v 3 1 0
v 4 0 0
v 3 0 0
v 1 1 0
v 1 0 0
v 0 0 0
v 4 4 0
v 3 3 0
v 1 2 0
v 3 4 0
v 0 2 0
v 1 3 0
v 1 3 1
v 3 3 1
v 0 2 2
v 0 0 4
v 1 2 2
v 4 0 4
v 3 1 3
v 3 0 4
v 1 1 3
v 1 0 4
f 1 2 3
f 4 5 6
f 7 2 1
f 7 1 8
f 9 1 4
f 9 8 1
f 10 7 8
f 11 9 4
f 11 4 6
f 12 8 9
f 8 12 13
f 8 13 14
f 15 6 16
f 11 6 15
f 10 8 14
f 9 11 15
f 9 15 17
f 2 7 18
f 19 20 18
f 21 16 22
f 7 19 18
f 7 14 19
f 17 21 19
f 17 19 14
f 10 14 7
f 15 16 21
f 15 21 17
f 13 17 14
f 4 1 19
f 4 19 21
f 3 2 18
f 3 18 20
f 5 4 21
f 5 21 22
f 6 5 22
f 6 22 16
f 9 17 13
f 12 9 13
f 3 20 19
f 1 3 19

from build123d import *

# Parameters (mm, degrees)
BOSS_EXTRUDE1_DEPTH = 4
CUT_EXTRUDE2_DEPTH  = 10


with BuildPart() as part:
    # Sketch1 → Boss-Extrude1 (new body)
    with BuildSketch(Plane.XY):
        Polygon((0, 0), (0, 2), (1, 2), (1, 3), (3, 3), (3, 4), (4, 4), (4, 0), (3, 0), (3, 1), (1, 1), (1, 0), align=None)
    extrude(amount=BOSS_EXTRUDE1_DEPTH)

    # Sketch3 → Cut-Extrude2 (cut)
    with BuildSketch(Plane.ZY):
        Polygon((4, 0), (0, 4), (4, 4), align=None)
    extrude(amount=-CUT_EXTRUDE2_DEPTH, mode=Mode.SUBTRACT)


solid = part.part
